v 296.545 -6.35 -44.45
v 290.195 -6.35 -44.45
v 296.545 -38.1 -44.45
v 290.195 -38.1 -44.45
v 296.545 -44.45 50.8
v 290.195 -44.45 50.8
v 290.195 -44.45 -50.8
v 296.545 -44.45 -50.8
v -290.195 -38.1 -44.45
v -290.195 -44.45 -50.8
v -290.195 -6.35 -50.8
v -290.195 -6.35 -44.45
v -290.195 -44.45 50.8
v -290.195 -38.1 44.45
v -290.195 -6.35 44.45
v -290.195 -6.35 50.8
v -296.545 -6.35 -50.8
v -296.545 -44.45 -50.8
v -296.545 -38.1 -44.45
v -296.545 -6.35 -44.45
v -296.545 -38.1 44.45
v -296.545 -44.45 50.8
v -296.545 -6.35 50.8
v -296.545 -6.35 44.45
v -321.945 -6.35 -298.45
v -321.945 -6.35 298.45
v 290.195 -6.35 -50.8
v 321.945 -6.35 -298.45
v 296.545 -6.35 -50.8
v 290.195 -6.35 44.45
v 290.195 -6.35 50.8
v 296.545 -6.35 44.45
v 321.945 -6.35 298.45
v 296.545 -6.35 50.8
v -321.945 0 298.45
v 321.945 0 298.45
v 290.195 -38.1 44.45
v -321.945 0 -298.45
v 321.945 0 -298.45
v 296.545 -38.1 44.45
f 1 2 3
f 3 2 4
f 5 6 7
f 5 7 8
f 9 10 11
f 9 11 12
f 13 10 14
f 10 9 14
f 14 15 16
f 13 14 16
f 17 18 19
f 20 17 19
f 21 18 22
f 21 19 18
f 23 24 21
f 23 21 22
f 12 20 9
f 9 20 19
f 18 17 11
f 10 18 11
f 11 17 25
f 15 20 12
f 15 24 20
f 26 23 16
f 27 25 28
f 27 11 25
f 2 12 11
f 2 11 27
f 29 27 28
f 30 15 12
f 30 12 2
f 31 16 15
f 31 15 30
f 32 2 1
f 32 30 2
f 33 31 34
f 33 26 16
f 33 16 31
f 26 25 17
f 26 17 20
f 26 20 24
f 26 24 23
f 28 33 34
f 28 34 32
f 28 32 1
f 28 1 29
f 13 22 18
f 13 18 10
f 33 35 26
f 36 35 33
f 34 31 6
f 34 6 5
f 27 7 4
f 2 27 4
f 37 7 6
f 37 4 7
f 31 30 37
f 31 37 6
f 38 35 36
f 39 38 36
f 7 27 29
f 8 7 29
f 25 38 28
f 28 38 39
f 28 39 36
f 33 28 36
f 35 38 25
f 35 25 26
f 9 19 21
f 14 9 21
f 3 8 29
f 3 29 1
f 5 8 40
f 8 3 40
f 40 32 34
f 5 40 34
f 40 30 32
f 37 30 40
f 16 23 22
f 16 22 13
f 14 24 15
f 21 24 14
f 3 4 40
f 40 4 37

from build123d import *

# Parameters (mm, degrees)
F0_W     = 643.89
F0_H     = 596.9
F1_DEPTH = 6.35
F2_W     = 6.35
F2_H     = 101.6
F3_DEPTH = 38.1
F4_W     = 31.75
F4_H     = 88.9
F5_DEPTH = 609.6


with BuildPart() as f1:
    # F0 (on Front) → F1 (new body)
    with BuildSketch(Plane.XZ):
        Rectangle(F0_W, F0_H)
    extrude(amount=F1_DEPTH)

    # F2 (on face) → F3 (join)
    with BuildSketch(Plane.XZ.offset(6.35)):
        with Locations((-293.37, 0)):
            Rectangle(F2_W, F2_H)
        with Locations((293.37, 0)):
            Rectangle(F2_W, F2_H)
    extrude(amount=F3_DEPTH)

    # F4 (on face) → F5 (cut)
    with BuildSketch(Plane(origin=(-296.545, 0, 0), x_dir=(0, -1, 0), z_dir=(-1, 0, 0))):
        with Locations((22.225, 0)):
            Rectangle(F4_W, F4_H)
    extrude(amount=-F5_DEPTH, mode=Mode.SUBTRACT)


solid = f1.part
